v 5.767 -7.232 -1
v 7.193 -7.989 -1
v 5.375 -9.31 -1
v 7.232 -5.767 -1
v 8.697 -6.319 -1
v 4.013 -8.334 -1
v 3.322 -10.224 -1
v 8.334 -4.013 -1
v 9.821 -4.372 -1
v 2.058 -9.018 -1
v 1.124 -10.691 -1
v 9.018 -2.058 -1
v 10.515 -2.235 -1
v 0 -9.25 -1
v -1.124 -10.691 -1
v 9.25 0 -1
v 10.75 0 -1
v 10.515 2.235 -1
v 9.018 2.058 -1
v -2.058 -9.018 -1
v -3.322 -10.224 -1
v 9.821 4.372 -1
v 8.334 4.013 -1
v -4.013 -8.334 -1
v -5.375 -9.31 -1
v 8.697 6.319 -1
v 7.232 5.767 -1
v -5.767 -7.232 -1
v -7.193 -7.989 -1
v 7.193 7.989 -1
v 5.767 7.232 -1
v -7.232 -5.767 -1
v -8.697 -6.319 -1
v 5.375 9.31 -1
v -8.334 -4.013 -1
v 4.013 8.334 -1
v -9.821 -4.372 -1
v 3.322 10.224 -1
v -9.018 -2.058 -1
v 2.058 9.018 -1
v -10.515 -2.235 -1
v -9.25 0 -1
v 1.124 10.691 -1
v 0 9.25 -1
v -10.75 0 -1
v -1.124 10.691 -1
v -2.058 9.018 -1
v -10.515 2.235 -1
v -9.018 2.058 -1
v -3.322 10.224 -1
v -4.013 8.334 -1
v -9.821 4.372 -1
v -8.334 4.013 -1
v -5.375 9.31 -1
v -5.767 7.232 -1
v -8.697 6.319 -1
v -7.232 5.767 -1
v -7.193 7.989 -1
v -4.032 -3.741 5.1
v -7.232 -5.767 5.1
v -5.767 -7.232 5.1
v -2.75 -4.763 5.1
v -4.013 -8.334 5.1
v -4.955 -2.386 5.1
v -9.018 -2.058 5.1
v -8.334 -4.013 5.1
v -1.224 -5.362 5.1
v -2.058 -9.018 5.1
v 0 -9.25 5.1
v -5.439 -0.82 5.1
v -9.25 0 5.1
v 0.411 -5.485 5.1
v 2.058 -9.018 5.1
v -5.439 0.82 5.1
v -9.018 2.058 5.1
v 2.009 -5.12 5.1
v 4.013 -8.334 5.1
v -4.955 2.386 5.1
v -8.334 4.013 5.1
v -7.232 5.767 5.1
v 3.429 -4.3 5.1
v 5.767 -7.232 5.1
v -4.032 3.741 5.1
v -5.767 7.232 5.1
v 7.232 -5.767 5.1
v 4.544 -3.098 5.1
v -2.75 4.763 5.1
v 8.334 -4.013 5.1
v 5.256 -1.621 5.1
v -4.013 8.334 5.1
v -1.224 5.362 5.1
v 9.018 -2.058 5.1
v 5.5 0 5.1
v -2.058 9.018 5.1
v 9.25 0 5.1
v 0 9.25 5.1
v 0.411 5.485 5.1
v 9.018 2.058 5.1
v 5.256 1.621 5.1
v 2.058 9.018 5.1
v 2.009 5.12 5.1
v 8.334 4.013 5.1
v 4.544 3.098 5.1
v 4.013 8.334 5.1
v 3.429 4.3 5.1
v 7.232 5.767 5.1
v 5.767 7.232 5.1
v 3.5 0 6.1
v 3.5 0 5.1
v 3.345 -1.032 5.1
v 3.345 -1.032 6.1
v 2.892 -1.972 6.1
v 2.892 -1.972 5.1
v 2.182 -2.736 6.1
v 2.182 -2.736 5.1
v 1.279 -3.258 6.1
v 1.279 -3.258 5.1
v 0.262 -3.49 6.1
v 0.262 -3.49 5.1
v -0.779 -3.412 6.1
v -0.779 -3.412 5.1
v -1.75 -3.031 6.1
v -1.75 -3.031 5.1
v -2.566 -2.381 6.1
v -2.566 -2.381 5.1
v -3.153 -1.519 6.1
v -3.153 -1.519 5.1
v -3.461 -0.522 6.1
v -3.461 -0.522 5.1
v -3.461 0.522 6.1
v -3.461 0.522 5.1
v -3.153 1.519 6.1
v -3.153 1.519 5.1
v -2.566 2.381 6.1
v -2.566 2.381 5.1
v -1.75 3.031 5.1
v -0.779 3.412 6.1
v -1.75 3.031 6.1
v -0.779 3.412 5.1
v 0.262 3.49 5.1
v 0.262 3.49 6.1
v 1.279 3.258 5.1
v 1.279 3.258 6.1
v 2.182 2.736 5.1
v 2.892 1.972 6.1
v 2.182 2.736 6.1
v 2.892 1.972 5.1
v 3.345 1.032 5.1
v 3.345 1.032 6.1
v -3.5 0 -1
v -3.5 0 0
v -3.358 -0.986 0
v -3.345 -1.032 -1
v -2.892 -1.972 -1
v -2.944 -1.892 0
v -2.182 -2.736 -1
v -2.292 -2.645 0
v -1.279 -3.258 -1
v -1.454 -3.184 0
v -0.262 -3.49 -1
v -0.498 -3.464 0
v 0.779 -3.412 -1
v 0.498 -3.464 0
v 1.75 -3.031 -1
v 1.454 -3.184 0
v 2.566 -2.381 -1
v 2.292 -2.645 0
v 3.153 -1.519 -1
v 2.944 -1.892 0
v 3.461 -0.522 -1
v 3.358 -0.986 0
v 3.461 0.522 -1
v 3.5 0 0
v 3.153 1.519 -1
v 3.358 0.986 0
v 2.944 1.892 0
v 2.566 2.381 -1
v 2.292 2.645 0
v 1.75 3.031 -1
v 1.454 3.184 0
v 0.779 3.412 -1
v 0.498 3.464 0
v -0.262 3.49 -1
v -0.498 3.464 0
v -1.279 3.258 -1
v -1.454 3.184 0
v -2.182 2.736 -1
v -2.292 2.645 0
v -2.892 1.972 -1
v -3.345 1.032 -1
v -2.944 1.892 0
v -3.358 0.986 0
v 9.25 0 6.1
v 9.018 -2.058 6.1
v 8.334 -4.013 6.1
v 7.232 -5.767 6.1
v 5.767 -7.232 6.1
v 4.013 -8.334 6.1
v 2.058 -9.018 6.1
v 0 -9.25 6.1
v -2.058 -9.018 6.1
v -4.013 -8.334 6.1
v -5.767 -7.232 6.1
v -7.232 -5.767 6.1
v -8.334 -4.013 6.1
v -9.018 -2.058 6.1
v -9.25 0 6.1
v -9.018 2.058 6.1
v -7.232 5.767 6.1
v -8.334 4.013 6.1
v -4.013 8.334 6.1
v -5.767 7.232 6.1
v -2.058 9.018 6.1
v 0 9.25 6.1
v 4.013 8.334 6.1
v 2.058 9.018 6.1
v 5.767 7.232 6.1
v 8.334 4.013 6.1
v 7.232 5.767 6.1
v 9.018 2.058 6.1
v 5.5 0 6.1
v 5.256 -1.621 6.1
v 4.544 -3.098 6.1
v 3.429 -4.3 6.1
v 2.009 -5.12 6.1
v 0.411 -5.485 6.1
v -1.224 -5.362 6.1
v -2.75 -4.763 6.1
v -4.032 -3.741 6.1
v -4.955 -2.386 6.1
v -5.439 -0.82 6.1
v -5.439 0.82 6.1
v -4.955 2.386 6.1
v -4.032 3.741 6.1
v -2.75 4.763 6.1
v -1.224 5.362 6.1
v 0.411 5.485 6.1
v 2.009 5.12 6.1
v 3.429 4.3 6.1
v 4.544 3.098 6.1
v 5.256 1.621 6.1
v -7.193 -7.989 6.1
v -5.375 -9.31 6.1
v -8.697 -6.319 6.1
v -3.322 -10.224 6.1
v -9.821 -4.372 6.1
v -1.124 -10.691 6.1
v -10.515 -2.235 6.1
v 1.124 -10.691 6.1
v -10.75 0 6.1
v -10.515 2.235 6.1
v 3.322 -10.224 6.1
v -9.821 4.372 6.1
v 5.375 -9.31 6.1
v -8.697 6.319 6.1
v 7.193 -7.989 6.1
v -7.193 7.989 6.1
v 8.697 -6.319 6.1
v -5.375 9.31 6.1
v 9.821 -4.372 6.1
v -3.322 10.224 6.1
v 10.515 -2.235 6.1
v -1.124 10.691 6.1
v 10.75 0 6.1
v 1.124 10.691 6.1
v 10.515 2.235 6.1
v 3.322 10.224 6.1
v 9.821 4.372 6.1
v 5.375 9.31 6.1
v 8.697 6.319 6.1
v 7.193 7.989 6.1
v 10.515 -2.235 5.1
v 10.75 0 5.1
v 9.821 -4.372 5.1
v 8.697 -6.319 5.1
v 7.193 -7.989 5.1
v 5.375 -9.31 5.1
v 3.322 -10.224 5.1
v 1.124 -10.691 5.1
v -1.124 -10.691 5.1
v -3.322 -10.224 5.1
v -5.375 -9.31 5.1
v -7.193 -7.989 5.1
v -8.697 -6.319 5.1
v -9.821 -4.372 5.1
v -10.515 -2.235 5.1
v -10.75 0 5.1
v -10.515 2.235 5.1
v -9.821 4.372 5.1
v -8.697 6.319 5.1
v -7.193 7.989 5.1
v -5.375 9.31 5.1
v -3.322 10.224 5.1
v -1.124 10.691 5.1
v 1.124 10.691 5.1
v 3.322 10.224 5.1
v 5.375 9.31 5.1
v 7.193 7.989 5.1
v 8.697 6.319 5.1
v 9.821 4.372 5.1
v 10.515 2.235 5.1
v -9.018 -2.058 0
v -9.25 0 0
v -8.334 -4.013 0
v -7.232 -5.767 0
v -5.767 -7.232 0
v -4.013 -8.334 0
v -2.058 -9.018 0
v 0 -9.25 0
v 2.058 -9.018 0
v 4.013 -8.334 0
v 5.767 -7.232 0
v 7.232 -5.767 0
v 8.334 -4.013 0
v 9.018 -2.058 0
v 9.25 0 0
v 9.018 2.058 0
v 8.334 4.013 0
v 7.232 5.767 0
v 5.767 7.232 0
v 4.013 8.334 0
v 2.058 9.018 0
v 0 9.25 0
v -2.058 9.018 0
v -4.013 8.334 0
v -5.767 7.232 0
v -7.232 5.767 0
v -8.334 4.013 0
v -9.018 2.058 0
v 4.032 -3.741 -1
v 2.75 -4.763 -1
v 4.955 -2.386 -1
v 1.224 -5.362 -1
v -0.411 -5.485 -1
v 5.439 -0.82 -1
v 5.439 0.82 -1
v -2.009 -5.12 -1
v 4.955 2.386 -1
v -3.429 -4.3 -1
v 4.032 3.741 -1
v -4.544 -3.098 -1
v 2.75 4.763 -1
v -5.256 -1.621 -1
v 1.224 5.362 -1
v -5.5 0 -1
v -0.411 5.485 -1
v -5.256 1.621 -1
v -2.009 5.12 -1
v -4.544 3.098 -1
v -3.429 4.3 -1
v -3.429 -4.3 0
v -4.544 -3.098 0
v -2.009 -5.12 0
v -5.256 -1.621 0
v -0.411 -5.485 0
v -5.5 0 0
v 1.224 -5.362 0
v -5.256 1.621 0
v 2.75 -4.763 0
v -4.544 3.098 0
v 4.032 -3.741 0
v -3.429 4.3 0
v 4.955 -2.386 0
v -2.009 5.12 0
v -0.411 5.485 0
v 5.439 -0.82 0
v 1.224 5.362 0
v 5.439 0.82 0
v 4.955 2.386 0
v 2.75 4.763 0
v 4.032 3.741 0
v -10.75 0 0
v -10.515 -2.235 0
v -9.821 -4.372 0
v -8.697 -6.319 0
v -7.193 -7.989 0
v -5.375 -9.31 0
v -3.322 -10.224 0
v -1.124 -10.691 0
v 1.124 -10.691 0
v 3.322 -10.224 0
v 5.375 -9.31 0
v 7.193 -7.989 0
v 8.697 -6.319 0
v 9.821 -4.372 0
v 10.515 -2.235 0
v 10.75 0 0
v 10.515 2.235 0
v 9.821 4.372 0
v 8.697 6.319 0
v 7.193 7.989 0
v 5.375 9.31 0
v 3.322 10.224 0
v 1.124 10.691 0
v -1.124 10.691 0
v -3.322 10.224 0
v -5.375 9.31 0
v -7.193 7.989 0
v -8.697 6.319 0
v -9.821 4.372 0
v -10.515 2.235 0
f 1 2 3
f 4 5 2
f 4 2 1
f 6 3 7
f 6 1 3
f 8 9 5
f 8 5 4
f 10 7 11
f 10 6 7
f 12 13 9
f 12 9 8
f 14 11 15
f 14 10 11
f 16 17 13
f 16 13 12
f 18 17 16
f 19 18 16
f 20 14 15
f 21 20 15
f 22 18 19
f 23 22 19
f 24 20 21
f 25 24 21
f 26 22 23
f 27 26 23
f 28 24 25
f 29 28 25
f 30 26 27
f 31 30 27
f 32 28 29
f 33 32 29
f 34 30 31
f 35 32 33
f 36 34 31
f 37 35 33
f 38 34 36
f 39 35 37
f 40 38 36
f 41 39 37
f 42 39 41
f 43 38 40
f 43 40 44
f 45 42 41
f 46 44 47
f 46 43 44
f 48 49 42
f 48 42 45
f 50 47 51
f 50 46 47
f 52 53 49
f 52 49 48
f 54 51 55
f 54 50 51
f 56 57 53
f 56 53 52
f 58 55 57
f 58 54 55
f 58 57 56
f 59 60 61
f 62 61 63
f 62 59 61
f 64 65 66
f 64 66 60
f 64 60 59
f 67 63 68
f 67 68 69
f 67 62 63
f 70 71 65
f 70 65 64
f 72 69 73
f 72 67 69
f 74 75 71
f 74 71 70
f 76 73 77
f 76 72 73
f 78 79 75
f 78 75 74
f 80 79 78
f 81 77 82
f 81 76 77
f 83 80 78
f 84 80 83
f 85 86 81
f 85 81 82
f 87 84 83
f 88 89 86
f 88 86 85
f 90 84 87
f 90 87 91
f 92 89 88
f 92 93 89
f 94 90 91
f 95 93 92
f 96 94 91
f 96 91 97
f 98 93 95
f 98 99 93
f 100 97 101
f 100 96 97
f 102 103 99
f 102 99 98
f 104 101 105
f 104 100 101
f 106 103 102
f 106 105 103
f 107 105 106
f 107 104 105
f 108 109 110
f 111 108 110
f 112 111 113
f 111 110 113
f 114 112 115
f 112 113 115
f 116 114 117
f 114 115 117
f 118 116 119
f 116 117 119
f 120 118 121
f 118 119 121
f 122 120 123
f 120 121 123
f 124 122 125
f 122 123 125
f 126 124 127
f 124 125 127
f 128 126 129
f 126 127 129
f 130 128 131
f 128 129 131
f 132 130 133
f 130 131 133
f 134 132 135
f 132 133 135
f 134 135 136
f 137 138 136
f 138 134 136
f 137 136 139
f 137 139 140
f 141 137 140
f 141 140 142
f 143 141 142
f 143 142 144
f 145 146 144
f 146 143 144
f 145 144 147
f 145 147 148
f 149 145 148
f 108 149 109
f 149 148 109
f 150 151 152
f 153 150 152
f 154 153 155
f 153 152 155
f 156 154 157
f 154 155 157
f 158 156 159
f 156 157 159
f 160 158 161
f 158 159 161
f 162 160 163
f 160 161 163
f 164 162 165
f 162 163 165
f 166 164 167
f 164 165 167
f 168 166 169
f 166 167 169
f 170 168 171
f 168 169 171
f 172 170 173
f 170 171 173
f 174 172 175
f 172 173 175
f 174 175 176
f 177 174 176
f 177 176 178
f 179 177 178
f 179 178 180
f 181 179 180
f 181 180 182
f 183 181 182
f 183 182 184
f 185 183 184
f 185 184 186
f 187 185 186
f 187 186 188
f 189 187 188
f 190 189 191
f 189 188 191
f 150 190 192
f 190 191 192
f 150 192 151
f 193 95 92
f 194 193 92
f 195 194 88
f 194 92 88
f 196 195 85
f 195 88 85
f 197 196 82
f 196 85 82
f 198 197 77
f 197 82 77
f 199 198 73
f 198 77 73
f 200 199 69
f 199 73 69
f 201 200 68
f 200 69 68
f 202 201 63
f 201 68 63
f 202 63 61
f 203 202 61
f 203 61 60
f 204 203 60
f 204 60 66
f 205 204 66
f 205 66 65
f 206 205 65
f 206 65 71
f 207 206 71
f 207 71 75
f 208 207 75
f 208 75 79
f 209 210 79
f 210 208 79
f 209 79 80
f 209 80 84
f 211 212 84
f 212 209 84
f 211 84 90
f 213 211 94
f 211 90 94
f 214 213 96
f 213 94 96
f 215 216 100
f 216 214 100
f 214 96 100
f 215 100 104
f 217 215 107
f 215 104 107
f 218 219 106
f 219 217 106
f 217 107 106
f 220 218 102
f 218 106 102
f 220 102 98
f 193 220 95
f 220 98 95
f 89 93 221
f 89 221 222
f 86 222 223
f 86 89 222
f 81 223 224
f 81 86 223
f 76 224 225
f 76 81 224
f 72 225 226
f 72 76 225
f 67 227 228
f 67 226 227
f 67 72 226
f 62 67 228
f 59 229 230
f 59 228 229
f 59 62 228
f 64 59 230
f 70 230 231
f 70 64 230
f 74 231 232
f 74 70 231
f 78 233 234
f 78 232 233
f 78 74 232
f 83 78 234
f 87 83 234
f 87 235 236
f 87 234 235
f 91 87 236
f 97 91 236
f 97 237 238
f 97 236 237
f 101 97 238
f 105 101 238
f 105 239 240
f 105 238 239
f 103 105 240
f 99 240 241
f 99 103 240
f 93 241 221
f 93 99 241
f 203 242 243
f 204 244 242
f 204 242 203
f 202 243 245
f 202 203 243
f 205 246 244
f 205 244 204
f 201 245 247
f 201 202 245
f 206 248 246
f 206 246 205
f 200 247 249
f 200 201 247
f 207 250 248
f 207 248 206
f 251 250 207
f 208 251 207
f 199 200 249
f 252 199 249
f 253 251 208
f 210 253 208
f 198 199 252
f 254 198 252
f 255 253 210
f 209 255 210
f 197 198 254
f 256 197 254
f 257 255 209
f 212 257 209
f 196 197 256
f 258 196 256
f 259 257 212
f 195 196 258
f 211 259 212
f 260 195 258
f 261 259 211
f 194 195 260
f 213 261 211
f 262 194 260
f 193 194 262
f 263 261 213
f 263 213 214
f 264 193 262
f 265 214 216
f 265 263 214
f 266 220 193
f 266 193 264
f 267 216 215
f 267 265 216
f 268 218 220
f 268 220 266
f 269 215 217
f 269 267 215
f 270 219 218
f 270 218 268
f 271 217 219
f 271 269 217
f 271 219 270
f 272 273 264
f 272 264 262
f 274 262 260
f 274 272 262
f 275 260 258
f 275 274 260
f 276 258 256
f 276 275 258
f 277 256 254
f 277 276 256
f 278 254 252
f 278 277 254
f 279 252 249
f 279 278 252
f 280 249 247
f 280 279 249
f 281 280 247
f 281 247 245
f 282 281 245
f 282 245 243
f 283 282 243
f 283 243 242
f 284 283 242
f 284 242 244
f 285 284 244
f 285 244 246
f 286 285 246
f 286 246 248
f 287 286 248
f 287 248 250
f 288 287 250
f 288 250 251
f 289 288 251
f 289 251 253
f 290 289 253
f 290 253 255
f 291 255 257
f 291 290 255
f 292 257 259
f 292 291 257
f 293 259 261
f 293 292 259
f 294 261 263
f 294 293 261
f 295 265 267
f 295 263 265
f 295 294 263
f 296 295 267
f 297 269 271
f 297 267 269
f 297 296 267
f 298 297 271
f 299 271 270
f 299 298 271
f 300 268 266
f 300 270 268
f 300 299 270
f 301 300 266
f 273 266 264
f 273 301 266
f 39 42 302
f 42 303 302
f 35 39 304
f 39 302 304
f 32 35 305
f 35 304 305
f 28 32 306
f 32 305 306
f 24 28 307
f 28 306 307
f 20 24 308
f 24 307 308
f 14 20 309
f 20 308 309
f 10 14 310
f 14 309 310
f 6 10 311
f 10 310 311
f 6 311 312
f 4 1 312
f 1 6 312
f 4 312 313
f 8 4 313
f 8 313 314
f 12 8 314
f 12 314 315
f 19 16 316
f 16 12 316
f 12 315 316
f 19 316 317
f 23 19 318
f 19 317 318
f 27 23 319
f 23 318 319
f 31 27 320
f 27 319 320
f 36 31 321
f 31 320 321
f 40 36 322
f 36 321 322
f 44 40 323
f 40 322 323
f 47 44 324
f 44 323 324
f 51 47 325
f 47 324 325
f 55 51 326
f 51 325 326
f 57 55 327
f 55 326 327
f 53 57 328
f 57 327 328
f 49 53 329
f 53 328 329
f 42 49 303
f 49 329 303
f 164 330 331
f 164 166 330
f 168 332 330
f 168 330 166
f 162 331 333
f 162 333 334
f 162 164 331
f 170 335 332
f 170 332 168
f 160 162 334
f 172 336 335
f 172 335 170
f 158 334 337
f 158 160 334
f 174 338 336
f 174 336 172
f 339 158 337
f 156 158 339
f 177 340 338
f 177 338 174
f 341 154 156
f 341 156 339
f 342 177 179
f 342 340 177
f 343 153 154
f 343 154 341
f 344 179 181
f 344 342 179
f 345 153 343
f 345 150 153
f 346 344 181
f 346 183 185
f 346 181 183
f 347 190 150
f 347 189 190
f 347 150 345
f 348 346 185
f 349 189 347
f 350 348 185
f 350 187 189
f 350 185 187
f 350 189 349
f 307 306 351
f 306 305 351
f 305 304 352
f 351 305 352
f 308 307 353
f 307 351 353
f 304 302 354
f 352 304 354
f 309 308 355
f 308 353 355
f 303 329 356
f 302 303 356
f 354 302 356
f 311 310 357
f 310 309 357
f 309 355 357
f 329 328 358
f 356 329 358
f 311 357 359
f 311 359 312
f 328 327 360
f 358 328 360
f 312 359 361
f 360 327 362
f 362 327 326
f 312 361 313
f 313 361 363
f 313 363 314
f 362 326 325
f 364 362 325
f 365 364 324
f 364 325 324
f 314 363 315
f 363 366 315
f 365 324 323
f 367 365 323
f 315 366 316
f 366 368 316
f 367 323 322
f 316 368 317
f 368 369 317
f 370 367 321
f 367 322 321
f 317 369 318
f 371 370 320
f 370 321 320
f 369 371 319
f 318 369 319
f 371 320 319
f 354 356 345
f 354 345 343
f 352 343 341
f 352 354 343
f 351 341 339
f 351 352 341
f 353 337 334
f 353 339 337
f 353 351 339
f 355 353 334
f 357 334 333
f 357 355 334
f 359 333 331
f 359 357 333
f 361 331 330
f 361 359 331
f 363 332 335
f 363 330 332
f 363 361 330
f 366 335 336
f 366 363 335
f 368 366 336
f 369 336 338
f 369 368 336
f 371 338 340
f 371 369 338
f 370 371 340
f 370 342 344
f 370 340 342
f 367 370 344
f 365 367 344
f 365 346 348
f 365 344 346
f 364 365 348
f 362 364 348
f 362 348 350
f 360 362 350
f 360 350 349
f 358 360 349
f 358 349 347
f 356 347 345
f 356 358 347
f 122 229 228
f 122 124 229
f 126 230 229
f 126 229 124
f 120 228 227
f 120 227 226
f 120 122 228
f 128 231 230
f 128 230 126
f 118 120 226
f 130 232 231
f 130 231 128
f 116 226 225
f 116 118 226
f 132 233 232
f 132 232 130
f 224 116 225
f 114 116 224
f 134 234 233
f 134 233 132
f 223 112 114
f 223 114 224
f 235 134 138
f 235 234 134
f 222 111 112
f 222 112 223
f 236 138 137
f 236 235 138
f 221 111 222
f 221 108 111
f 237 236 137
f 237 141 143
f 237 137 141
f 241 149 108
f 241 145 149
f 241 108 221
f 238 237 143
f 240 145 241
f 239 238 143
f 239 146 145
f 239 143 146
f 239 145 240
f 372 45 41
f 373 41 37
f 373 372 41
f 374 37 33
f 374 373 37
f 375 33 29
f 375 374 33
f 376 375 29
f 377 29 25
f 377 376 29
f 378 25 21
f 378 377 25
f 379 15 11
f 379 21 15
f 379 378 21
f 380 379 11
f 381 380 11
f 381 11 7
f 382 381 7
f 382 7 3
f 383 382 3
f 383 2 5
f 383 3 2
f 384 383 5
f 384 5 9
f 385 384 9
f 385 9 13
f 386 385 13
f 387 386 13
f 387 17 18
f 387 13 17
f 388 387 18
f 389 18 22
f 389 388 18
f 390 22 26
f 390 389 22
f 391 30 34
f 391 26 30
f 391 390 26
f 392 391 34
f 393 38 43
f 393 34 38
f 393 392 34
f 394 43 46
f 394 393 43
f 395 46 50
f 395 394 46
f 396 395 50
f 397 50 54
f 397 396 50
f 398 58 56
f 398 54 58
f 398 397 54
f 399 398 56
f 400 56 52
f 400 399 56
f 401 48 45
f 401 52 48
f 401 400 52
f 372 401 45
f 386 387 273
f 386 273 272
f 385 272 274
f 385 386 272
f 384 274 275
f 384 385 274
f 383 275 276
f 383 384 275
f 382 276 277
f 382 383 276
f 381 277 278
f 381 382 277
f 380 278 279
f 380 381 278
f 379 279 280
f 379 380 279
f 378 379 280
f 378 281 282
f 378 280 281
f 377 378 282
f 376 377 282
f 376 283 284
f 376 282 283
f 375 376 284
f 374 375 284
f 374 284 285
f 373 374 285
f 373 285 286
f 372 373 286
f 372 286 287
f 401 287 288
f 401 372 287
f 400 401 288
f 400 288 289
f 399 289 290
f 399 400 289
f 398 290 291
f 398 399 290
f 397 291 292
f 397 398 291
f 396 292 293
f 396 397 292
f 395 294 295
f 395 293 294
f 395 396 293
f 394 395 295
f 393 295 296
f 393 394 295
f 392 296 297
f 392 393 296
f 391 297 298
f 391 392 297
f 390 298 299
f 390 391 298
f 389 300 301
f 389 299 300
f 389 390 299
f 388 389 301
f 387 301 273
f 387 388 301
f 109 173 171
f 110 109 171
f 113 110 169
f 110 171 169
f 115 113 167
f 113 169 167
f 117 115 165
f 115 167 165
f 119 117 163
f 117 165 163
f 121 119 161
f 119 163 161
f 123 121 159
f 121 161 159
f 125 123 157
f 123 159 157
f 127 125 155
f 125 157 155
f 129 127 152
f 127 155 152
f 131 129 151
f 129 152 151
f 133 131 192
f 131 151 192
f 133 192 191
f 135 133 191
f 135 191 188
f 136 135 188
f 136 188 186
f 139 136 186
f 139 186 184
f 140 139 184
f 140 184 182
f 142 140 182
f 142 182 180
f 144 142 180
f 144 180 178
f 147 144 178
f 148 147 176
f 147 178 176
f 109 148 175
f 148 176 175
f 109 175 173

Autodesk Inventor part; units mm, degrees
ref_plane "YZ Plane" through (0, 0, 0) normal (1, 0, 0) x (0, 1, 0)
ref_plane "XZ Plane" through (0, 0, 0) normal (0, 1, 0) x (-1, 0, 0)
ref_plane "XY Plane" through (0, 0, 0) normal (0, 0, 1) x (1, 0, 0)
sketch "Sketch1" plane through (0, 0, 0) normal (0, 0, 1) x (1, 0, 0)
  circle A0 centre (0, 0) radius 3.5
  circle A1 centre (0, 0) radius 10.75
  dimension "d0" = 7
  dimension "d1" = 21.5
extrude "Extrusion1" add sketch "Sketch1" along normal blind 5.1
sketch "Sketch2" plane through (0, 0, 5.1) normal (0, 0, 1) x (1, 0, 0)
  circle A0 centre (0, 0) radius 10.75 projected
  circle A1 centre (0, 0) radius 3.5 projected
  circle A2 centre (0, 0) radius 5.5
  circle A3 centre (0, 0) radius 9.25
  dimension "d4" = 11
  dimension "d5" = 18.5
sketch "Sketch3" plane through (0, 0, 0) normal (0, 0, -1) x (-1, 0, 0)
  circle A0 centre (0, 0) radius 9.25 projected
  circle A1 centre (0, 0) radius 5.5 projected
  circle A2 centre (0, 0) radius 3.5 projected
  circle A3 centre (0, 0) radius 10.75 projected
extrude "Extrusion2" add sketch "Sketch3" along normal blind 1
extrude "Extrusion3" add sketch "Sketch2" along normal blind 1
properties part number "Cojinete"
